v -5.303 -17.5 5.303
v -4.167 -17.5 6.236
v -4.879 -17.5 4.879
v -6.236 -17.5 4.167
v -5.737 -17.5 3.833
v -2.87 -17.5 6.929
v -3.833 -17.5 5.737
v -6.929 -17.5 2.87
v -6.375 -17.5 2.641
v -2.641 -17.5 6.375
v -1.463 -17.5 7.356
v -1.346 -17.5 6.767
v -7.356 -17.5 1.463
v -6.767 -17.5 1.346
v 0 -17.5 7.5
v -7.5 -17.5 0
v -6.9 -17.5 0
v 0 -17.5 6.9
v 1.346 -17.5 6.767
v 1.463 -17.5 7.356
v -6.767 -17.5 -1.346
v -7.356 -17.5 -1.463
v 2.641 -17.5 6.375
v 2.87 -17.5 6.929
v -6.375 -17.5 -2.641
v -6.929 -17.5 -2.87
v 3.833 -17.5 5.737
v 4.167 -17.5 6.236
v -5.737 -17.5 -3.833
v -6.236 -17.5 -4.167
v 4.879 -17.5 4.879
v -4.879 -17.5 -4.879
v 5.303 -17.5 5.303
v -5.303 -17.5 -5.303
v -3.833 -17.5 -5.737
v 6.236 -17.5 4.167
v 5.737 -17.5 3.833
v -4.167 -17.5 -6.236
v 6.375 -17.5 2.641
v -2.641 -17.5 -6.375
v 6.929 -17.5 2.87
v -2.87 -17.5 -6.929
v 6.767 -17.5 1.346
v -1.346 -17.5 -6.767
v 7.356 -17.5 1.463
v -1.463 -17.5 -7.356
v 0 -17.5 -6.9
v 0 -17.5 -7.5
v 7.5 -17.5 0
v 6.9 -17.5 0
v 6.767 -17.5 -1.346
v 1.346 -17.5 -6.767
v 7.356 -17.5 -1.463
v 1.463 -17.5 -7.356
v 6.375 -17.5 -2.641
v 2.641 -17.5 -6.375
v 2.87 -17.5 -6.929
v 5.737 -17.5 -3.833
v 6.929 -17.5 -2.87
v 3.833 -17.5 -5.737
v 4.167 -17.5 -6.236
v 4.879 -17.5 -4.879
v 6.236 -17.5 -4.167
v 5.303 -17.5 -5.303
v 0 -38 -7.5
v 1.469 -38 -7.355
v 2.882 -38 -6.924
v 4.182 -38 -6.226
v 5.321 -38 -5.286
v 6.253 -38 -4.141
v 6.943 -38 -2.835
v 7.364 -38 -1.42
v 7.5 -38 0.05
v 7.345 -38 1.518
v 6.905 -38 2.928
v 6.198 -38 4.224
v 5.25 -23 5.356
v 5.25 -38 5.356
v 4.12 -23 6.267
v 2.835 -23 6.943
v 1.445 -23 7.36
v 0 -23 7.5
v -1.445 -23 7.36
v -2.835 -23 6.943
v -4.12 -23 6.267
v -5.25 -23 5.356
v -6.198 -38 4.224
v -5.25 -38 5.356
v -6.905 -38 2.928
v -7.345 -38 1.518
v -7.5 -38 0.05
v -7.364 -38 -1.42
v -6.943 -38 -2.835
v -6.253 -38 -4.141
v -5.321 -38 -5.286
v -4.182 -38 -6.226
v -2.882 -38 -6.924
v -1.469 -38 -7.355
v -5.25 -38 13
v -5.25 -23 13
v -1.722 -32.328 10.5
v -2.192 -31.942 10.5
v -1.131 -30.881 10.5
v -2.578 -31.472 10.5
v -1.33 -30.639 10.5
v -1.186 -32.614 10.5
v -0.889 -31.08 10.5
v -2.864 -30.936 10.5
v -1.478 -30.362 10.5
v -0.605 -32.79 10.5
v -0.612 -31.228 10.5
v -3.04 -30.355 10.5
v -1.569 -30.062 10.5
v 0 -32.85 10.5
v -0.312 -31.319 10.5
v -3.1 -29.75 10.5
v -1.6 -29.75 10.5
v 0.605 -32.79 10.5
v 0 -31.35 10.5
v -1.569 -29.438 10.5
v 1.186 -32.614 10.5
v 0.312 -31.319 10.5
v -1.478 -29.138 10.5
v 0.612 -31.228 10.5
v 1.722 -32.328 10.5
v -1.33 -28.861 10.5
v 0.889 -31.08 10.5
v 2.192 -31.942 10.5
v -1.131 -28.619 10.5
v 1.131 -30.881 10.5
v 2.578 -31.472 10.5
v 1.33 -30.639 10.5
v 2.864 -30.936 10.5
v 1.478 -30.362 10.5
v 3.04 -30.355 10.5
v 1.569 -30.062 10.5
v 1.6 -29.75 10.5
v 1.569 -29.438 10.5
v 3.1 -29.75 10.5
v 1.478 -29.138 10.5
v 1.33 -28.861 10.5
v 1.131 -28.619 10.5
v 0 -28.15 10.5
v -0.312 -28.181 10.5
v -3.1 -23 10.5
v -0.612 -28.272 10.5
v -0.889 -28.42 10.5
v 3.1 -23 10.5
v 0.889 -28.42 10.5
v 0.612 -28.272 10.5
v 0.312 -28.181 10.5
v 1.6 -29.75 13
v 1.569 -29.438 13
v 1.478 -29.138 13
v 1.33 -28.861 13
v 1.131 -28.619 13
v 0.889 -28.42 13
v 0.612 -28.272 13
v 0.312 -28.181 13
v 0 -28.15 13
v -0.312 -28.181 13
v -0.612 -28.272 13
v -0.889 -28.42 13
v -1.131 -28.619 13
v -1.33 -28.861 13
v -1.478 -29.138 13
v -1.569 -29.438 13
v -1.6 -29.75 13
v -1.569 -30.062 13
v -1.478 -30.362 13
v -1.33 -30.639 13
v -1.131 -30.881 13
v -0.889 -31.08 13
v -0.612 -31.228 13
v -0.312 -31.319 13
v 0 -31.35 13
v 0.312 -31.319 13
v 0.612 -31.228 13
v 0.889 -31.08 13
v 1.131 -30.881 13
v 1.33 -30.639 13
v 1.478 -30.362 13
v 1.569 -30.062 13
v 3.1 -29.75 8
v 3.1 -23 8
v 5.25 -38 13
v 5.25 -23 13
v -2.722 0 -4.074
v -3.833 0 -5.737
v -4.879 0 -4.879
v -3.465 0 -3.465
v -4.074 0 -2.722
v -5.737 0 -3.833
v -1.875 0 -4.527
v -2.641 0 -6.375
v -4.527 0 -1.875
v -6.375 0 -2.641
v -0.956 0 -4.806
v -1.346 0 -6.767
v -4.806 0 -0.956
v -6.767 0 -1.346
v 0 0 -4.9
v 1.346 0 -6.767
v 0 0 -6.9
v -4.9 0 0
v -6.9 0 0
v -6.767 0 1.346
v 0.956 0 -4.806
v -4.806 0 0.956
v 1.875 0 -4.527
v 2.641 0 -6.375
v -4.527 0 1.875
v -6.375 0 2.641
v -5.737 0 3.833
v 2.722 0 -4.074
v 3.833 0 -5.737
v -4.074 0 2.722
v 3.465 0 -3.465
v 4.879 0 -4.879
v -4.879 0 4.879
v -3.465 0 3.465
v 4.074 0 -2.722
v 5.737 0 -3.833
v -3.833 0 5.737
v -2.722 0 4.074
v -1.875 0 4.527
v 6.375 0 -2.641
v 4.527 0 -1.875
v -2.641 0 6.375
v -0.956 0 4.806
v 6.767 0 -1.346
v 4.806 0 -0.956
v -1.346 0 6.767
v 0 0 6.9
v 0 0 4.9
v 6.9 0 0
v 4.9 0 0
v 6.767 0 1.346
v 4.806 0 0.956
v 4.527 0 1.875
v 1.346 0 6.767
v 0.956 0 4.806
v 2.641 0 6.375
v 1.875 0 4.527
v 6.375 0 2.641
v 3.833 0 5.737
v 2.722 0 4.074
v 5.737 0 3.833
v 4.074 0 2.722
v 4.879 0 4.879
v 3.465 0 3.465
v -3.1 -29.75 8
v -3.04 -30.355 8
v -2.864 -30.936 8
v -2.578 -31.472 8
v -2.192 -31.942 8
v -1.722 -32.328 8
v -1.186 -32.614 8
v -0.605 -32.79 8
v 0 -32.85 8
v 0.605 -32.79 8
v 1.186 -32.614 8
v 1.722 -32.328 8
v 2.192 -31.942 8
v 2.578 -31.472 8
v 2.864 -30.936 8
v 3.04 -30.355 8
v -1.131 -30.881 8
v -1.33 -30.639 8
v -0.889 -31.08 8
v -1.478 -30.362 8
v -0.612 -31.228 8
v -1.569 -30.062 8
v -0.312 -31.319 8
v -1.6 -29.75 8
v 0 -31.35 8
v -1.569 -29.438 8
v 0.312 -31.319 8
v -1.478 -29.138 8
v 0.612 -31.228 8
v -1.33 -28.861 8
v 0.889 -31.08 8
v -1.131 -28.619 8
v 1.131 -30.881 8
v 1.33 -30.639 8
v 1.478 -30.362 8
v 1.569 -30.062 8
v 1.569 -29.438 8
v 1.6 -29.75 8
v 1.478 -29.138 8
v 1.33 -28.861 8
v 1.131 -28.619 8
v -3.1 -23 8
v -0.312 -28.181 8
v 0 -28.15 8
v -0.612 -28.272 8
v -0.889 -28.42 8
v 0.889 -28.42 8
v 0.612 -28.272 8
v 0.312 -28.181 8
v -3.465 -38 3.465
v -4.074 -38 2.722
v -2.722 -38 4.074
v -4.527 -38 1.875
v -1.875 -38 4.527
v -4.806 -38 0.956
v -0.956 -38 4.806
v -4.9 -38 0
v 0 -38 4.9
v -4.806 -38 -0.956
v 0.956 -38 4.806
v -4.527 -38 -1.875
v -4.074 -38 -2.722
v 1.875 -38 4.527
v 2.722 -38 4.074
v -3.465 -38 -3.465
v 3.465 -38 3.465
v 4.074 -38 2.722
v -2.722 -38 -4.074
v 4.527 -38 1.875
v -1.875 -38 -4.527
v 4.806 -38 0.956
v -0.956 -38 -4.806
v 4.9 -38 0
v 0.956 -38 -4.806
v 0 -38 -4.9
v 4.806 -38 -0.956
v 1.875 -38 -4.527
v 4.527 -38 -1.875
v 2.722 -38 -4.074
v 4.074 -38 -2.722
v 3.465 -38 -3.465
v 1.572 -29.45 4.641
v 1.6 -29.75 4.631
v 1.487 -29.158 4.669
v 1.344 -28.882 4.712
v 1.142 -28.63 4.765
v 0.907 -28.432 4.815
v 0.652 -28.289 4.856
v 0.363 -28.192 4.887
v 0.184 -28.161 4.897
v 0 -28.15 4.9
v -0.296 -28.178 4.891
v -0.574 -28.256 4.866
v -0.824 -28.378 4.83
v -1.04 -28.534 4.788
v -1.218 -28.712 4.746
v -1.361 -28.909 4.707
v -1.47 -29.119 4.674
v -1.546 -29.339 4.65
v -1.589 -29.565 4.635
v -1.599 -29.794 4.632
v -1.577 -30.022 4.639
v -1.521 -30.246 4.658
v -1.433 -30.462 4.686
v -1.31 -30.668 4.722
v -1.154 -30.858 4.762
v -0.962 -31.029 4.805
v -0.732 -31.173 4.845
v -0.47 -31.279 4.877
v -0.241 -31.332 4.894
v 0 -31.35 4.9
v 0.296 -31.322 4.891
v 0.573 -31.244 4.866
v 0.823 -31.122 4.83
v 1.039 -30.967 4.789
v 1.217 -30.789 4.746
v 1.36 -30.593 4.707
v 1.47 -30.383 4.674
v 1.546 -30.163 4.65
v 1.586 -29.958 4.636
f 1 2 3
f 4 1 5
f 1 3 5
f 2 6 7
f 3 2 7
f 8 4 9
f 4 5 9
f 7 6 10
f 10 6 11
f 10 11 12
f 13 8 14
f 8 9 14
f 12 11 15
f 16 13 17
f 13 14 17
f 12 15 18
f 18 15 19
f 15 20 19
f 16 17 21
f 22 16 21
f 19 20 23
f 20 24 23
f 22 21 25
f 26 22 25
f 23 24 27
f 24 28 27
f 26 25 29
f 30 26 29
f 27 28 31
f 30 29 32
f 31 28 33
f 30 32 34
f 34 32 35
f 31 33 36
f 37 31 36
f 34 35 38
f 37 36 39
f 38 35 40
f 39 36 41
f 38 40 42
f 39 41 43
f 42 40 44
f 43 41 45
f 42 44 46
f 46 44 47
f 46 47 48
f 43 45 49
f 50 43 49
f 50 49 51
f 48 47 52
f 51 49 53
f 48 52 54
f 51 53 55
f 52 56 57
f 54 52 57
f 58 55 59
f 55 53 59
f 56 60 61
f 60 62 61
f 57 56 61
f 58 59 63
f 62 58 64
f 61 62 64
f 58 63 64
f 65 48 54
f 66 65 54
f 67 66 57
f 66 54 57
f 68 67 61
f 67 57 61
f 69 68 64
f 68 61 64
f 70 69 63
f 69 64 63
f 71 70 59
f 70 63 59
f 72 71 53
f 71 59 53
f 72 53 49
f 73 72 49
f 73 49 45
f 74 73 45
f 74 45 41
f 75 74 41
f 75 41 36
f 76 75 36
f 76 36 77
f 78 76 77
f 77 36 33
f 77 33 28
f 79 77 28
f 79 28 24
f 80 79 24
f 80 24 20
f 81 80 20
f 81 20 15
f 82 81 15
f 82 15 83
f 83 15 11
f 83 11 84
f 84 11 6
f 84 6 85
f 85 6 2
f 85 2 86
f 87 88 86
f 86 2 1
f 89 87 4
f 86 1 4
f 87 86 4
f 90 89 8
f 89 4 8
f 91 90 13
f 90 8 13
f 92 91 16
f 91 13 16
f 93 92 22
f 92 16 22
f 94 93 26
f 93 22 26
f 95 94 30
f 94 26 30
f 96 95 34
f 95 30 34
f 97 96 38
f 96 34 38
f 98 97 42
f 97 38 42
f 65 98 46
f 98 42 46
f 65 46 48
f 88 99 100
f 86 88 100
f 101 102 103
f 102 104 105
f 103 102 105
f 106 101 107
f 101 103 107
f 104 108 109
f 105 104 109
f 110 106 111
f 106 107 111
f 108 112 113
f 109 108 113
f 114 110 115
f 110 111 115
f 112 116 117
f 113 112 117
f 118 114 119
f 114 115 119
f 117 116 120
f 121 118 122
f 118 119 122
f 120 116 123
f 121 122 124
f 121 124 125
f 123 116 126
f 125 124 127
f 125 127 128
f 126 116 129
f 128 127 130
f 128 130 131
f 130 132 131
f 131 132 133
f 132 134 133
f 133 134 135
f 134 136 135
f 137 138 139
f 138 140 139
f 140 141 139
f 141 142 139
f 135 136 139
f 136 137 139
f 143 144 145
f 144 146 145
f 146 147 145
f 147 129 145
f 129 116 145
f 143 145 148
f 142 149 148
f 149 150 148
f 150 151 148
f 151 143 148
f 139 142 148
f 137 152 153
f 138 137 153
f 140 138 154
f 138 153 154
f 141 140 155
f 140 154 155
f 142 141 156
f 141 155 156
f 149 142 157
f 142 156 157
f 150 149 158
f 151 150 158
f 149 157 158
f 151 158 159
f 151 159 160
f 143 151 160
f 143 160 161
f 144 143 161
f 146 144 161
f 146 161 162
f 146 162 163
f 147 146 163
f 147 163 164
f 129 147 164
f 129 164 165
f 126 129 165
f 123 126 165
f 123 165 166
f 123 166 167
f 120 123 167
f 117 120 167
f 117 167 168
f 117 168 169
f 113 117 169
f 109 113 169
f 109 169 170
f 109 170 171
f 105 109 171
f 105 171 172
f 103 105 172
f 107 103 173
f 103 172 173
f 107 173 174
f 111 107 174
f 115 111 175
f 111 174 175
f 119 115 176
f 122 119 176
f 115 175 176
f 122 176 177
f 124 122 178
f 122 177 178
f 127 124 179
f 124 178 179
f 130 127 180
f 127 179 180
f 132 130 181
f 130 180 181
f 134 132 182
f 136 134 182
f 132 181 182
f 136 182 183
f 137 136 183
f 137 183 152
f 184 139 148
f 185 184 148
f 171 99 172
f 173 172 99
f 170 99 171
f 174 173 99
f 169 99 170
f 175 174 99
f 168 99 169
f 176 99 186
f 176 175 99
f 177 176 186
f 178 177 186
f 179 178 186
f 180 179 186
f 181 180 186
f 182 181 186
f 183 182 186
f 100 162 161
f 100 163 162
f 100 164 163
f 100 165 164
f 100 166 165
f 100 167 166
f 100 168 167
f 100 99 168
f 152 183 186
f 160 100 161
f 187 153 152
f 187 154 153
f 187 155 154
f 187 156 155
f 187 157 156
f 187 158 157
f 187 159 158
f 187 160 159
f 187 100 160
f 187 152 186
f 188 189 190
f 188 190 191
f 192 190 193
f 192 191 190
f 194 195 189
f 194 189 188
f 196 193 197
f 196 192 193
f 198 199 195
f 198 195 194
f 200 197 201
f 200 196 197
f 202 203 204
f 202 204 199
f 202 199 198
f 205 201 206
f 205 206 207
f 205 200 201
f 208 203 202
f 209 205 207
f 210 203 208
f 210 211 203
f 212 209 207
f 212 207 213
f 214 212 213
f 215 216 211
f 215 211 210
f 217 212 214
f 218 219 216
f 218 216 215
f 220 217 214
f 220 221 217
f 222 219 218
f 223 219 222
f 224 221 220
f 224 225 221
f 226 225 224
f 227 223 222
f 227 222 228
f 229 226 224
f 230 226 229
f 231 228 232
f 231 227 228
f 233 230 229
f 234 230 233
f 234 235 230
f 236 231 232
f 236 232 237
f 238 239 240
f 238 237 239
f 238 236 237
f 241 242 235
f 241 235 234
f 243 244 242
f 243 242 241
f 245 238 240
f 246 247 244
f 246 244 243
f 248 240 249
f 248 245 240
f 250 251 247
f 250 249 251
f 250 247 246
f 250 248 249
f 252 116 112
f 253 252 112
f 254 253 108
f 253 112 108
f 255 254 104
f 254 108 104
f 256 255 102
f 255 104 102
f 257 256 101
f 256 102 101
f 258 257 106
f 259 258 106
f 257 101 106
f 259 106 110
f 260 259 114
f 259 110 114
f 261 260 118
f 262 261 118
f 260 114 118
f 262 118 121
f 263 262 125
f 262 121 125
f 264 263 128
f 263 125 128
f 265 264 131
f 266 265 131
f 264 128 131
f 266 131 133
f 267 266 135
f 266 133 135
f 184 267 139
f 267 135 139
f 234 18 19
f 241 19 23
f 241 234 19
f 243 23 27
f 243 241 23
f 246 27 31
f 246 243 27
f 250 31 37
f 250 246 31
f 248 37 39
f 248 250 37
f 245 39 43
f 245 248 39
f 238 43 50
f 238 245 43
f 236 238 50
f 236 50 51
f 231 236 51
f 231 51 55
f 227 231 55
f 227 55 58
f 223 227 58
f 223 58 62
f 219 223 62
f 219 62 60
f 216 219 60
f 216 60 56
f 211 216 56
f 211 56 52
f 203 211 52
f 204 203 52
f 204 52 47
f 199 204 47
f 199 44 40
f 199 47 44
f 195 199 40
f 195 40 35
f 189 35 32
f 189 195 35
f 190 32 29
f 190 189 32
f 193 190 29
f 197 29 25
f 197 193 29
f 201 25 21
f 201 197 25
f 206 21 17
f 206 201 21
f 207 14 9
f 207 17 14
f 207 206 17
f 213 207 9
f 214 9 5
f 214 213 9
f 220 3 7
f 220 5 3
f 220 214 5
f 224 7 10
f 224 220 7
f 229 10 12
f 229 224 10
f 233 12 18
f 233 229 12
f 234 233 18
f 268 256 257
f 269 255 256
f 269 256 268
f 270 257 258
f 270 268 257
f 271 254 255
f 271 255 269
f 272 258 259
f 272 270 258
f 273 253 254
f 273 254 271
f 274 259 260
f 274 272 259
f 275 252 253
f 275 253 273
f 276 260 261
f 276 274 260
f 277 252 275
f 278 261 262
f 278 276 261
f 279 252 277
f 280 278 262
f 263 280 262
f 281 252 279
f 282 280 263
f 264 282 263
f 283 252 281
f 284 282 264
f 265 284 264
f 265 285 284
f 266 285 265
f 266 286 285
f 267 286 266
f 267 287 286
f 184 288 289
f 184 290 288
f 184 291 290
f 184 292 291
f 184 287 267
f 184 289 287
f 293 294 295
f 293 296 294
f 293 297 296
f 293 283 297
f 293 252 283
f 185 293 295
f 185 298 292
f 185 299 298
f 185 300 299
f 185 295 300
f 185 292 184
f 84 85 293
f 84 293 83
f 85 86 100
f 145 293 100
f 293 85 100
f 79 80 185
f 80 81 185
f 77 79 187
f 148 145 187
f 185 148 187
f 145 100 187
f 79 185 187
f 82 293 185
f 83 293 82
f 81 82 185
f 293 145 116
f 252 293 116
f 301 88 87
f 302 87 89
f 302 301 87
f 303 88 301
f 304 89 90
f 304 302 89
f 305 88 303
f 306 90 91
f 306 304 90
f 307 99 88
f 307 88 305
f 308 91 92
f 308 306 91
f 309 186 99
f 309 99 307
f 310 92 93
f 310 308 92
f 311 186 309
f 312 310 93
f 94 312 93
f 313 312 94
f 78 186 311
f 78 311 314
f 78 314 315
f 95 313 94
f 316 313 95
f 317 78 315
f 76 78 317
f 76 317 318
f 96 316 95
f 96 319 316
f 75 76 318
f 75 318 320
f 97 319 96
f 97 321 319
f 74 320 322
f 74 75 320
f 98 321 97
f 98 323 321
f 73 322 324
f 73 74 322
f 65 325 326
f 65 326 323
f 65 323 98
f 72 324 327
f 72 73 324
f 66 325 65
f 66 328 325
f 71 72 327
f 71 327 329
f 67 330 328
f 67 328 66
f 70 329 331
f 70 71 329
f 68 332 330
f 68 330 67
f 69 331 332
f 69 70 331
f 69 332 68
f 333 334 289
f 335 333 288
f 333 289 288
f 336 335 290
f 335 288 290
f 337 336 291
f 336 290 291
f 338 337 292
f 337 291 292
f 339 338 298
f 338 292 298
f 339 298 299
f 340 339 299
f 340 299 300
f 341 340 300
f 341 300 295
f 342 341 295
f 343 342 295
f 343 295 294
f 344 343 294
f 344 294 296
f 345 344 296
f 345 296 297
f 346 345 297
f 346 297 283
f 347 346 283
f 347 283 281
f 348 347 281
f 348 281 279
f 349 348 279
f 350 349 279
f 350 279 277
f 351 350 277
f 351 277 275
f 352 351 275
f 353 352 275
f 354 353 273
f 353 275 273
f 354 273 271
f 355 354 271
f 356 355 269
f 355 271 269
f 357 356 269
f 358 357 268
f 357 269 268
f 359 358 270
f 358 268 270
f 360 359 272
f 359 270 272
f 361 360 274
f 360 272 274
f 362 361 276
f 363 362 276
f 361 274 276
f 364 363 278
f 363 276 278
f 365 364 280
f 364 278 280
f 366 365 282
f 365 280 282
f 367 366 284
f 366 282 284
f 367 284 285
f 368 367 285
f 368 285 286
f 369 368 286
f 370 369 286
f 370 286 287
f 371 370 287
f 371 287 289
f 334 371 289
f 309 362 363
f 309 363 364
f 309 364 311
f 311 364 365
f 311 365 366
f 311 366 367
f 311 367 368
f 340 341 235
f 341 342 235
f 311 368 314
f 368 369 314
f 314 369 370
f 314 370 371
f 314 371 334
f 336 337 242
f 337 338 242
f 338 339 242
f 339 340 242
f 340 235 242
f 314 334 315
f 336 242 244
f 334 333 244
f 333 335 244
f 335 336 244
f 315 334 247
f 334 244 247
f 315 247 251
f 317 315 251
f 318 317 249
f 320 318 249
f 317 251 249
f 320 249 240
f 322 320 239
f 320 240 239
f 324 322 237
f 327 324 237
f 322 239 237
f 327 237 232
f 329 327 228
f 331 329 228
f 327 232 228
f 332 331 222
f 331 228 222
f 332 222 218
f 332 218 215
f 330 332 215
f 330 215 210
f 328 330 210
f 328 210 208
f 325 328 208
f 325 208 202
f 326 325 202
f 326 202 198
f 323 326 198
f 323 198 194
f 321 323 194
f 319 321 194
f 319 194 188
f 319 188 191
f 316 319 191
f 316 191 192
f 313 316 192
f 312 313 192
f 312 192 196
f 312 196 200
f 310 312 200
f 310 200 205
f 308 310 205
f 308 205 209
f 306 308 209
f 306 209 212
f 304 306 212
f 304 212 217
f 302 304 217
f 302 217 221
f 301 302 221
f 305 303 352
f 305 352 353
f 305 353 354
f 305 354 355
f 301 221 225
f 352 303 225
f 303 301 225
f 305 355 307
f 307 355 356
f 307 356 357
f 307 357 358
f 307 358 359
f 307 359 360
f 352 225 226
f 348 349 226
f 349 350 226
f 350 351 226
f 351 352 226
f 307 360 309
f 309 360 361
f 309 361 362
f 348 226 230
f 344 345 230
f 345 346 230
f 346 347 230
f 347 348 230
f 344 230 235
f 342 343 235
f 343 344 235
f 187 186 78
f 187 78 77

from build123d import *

# Parameters (mm, degrees)
SKETCH1_R                = 6.9
SKETCH1_R_2              = 4.9
BOSS_EXTRUDE1_DEPTH      = 38
SKETCH2_R                = 7.5
SKETCH2_R_2              = 6.9
BOSS_EXTRUDE2_DEPTH      = 20.5
BOSS_EXTRUDE3_REACH      = 22.5
BOSS_EXTRUDE3_END_RADIUS = 7.5
BOSS_EXTRUDE3_START      = 13
SKETCH3_W                = 10.5
SKETCH3_H                = 15
CUT_EXTRUDE1_START       = -2.5
CUT_EXTRUDE1_DEPTH       = 2.5
SKETCH5_R                = 1.6
CUT_EXTRUDE2_DEPTH       = 10


with BuildPart() as part:
    # Sketch1 → Boss-Extrude1 (new body)
    with BuildSketch(Plane(origin=(0, 0, 0), x_dir=(1, 0, 0), z_dir=(0, 1, 0))):
        with Locations(Location((0, 0, 0), (0, 0, 270))):  # turned: the seam where the file's is
            Circle(SKETCH1_R)
        with Locations(Location((0, 0, 0), (0, 0, 270))):  # turned: the seam where the file's is
            Circle(SKETCH1_R_2, mode=Mode.SUBTRACT)
    extrude(amount=-BOSS_EXTRUDE1_DEPTH)

    # Sketch2 → Boss-Extrude2 (add, through all)
    with BuildSketch(Plane(origin=(0, -17.5, 0), x_dir=(-1, 0, 0), z_dir=(0, -1, 0))):
        with Locations(Location((0, 0, 0), (0, 0, 90))):  # turned: the seam where the file's is
            Circle(SKETCH2_R)
        with Locations(Location((0, 0, 0), (0, 0, 270))):  # turned: the seam where the file's is
            Circle(SKETCH2_R_2, mode=Mode.SUBTRACT)
    extrude(amount=BOSS_EXTRUDE2_DEPTH)

    # Boss-Extrude3: up to this cylinder (the profile starts outside it)
    boss_extrude3_end = Plane(origin=(0, -30.5, 0), z_dir=(0, 1, 0)) * Cylinder(BOSS_EXTRUDE3_END_RADIUS, 61, mode=Mode.PRIVATE)
    # Sketch3 → Boss-Extrude3 (add, up to the surface)
    with BuildSketch(Plane.XY.offset(BOSS_EXTRUDE3_START), mode=Mode.PRIVATE) as boss_extrude3_sk1:
        with Locations((0, -30.5)):
            Rectangle(SKETCH3_W, SKETCH3_H)
    boss_extrude3_tool1 = extrude(boss_extrude3_sk1.sketch, amount=-BOSS_EXTRUDE3_REACH, mode=Mode.PRIVATE) - boss_extrude3_end
    add(boss_extrude3_tool1.solids().sort_by_distance((0, -30.5, 13))[0])

    # Sketch4 → Cut-Extrude1 (cut)
    with BuildSketch(Plane.XY.offset(13).offset(CUT_EXTRUDE1_START)):
        with BuildLine():
            Line((-3.1, -23), (-3.1, -29.75))
            ThreePointArc((-3.1, -29.75), (0, -32.85), (3.1, -29.75))
            Line((3.1, -29.75), (3.1, -23))
            Line((3.1, -23), (-3.1, -23))
        make_face()
    extrude(amount=-CUT_EXTRUDE1_DEPTH, mode=Mode.SUBTRACT)

    # Sketch5 → Cut-Extrude2 (cut)
    with BuildSketch(Plane.XY.offset(13)):
        with Locations((0, -29.75)):
            Circle(SKETCH5_R)
    extrude(amount=-CUT_EXTRUDE2_DEPTH, mode=Mode.SUBTRACT)


solid = part.part
